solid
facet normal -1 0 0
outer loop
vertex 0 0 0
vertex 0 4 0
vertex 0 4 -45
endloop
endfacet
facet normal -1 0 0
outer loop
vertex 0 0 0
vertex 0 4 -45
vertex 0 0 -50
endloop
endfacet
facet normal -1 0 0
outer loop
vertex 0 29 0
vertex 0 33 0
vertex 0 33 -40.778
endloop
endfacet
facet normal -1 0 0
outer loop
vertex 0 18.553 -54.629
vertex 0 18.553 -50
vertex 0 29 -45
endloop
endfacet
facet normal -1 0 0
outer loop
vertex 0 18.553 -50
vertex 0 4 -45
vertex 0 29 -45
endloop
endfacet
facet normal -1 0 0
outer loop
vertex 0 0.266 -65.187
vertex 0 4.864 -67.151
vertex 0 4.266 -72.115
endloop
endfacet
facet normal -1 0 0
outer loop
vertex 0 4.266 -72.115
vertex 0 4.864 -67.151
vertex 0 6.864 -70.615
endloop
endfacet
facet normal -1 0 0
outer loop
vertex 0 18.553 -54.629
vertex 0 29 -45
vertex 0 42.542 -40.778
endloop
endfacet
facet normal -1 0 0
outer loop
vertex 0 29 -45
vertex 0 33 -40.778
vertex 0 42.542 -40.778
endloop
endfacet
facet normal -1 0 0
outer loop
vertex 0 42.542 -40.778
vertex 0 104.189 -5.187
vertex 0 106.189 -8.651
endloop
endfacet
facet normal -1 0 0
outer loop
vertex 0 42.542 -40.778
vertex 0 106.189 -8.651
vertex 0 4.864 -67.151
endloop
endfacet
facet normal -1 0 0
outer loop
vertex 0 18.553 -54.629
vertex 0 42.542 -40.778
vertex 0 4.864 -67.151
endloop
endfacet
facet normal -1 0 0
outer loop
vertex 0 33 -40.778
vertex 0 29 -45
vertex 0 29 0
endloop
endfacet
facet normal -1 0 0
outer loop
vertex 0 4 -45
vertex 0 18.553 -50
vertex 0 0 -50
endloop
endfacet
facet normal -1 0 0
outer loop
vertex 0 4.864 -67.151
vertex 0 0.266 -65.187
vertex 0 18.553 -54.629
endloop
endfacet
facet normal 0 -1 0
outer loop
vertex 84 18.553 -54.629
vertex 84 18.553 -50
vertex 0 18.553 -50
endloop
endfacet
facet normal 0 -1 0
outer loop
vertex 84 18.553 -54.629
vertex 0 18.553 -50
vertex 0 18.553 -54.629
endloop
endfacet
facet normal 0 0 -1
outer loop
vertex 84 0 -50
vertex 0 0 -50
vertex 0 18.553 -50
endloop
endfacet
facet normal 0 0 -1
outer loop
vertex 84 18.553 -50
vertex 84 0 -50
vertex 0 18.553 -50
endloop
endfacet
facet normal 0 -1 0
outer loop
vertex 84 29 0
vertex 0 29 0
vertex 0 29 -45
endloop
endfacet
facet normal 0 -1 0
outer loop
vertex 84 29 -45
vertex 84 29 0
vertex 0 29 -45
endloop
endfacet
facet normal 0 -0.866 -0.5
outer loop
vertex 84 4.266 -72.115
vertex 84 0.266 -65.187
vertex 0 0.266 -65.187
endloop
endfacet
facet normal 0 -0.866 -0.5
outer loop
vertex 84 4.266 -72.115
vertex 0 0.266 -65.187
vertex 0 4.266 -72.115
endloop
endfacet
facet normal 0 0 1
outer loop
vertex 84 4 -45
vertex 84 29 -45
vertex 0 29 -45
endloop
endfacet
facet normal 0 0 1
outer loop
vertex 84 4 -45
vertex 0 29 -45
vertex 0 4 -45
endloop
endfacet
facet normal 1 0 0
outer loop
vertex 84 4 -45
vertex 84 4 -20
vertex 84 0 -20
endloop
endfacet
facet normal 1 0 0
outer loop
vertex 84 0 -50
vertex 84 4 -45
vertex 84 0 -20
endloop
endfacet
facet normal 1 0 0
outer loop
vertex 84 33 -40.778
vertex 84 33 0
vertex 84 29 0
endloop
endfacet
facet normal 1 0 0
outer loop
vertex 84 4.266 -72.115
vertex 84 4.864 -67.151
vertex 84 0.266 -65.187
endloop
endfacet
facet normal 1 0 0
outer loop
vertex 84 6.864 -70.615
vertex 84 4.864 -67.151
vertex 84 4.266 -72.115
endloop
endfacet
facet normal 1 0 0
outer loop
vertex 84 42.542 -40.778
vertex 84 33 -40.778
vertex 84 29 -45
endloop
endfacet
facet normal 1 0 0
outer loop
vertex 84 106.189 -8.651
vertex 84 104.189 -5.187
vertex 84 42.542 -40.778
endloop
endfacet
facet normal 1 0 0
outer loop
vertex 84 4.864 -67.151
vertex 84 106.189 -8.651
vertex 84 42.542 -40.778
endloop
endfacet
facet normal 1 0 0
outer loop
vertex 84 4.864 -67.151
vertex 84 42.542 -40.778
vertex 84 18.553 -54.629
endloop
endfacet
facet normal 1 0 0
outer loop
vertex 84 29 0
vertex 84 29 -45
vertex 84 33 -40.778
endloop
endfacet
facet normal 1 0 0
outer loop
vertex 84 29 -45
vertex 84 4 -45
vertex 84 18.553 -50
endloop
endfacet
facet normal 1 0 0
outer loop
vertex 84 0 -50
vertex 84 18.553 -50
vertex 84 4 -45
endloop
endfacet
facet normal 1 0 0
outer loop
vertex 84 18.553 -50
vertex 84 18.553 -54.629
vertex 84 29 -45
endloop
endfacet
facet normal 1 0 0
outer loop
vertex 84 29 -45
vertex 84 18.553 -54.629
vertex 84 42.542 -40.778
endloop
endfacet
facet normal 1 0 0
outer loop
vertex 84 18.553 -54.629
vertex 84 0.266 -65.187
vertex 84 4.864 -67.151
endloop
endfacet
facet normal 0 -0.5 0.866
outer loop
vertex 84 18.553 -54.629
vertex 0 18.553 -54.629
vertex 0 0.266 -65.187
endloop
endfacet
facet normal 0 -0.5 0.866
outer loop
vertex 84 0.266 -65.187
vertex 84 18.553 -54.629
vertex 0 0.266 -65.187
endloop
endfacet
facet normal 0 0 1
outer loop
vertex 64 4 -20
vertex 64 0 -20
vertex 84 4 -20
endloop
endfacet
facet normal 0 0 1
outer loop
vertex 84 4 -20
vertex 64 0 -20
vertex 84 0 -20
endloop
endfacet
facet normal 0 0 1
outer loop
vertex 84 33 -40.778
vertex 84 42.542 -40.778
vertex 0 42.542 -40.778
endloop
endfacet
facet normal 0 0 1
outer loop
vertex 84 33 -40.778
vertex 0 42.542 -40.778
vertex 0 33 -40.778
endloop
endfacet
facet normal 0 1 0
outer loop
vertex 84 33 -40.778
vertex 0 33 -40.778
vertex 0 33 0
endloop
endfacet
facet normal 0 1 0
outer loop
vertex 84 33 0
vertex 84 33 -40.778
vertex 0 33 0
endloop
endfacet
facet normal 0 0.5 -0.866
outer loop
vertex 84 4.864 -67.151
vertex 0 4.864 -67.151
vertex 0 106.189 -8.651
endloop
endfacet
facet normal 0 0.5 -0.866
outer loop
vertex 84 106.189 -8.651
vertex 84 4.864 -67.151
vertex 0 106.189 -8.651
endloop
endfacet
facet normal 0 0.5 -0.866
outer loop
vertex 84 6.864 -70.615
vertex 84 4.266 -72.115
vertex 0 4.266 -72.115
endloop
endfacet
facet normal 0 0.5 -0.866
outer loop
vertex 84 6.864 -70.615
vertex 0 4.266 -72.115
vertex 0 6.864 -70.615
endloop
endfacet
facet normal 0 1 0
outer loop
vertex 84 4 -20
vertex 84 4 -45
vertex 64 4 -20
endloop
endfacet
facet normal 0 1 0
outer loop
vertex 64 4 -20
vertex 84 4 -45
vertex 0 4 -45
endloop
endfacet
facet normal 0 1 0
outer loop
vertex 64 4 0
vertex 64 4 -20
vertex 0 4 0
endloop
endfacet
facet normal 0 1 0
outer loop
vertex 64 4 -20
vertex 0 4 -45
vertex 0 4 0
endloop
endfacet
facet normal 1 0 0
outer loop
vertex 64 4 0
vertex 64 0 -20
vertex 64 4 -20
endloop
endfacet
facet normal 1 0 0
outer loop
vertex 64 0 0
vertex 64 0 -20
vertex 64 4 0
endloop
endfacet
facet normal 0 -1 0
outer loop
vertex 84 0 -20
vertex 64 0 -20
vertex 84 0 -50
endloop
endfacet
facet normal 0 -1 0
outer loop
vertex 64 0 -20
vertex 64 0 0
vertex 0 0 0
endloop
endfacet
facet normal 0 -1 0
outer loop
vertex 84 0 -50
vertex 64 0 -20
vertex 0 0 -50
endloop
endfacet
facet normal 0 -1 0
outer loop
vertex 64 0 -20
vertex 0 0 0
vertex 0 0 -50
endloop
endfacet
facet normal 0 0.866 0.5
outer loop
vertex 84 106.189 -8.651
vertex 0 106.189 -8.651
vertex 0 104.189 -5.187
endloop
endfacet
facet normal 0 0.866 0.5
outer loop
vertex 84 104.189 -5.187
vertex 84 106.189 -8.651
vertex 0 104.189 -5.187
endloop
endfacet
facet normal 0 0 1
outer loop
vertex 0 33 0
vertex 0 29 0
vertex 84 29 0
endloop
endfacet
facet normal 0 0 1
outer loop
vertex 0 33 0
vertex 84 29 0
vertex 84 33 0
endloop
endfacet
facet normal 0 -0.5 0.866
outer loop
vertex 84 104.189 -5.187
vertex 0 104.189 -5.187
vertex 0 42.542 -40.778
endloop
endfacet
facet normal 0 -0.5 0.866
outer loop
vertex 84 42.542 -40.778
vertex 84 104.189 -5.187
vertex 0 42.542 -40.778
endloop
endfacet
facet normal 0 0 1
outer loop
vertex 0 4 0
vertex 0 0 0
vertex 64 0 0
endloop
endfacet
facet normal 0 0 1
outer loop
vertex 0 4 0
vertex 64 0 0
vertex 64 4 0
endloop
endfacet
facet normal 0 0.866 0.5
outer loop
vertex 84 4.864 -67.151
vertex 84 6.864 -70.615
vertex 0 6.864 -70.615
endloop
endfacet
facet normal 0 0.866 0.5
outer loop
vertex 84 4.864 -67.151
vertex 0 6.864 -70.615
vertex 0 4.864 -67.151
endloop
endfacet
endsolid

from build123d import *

# Parameters (mm, degrees)
SKETCH_1_W          = 45
SKETCH_1_H          = 4
SKETCH_1_W_2        = 5
EXTRUDE_1_DEPTH     = 84
SKETCH_2_W          = 20
SKETCH_2_H          = 20
CUT_EXTRUDE_1_DEPTH = 14
EXTRUDE_2_DEPTH     = 84


with BuildPart() as part:
    # Эскиз1 → Бобышка-Вытянуть1 (new body)
    with BuildSketch(Plane(origin=(0, 0, 0), x_dir=(0, 0, -1), z_dir=(1, 0, 0))):
        with Locations((22.5, 2)):
            Rectangle(SKETCH_1_W, SKETCH_1_H)
        with Locations((47.5, 2)):
            Rectangle(SKETCH_1_W_2, SKETCH_1_H)
        Polygon((45, 29), (45, 4), (50, 4), (50, 26.569712745), (48.596872999, 29), align=None)
        with Locations((22.5, 31)):
            Rectangle(SKETCH_1_W, SKETCH_1_H)
        Polygon((45, 33), (45, 29), (48.596872999, 29), (46.287471923, 33), align=None)
        Polygon((48.596872999, 29), (50, 26.569712745), (50, 29), align=None)
        Polygon((50, 29), (50, 26.569712745), (65.186719292, 0.265543331), (68.650820907, 2.265543331), (8.650820907, 106.188591785), (5.186719292, 104.188591785), (46.287471923, 33), (50, 33), align=None)
        Polygon((46.287471923, 33), (48.596872999, 29), (50, 29), (50, 33), align=None)
    extrude(amount=EXTRUDE_1_DEPTH)

    # Эскиз2 → Вырез-Вытянуть1 (cut)
    with BuildSketch(Plane.XZ):
        with Locations((74, -10)):
            Rectangle(SKETCH_2_W, SKETCH_2_H)
    extrude(amount=-CUT_EXTRUDE_1_DEPTH, mode=Mode.SUBTRACT)

    # Эскиз3 → Бобышка-Вытянуть2 (add)
    with BuildSketch(Plane(origin=(84, 0, 0), x_dir=(0, 0, -1), z_dir=(1, 0, 0))):
        Polygon((68.650820907, 2.265543331), (72.114922522, 4.265543331), (70.614922522, 6.863619543), (67.150820907, 4.863619543), align=None)
        Polygon((40.778226629, 42.54229276), (40.778226629, 33), (46.287471923, 33), align=None)
        Polygon((50, 26.569712745), (50, 18.552766001), (54.628586361, 18.552766001), align=None)
    extrude(amount=-EXTRUDE_2_DEPTH)


solid = part.part
